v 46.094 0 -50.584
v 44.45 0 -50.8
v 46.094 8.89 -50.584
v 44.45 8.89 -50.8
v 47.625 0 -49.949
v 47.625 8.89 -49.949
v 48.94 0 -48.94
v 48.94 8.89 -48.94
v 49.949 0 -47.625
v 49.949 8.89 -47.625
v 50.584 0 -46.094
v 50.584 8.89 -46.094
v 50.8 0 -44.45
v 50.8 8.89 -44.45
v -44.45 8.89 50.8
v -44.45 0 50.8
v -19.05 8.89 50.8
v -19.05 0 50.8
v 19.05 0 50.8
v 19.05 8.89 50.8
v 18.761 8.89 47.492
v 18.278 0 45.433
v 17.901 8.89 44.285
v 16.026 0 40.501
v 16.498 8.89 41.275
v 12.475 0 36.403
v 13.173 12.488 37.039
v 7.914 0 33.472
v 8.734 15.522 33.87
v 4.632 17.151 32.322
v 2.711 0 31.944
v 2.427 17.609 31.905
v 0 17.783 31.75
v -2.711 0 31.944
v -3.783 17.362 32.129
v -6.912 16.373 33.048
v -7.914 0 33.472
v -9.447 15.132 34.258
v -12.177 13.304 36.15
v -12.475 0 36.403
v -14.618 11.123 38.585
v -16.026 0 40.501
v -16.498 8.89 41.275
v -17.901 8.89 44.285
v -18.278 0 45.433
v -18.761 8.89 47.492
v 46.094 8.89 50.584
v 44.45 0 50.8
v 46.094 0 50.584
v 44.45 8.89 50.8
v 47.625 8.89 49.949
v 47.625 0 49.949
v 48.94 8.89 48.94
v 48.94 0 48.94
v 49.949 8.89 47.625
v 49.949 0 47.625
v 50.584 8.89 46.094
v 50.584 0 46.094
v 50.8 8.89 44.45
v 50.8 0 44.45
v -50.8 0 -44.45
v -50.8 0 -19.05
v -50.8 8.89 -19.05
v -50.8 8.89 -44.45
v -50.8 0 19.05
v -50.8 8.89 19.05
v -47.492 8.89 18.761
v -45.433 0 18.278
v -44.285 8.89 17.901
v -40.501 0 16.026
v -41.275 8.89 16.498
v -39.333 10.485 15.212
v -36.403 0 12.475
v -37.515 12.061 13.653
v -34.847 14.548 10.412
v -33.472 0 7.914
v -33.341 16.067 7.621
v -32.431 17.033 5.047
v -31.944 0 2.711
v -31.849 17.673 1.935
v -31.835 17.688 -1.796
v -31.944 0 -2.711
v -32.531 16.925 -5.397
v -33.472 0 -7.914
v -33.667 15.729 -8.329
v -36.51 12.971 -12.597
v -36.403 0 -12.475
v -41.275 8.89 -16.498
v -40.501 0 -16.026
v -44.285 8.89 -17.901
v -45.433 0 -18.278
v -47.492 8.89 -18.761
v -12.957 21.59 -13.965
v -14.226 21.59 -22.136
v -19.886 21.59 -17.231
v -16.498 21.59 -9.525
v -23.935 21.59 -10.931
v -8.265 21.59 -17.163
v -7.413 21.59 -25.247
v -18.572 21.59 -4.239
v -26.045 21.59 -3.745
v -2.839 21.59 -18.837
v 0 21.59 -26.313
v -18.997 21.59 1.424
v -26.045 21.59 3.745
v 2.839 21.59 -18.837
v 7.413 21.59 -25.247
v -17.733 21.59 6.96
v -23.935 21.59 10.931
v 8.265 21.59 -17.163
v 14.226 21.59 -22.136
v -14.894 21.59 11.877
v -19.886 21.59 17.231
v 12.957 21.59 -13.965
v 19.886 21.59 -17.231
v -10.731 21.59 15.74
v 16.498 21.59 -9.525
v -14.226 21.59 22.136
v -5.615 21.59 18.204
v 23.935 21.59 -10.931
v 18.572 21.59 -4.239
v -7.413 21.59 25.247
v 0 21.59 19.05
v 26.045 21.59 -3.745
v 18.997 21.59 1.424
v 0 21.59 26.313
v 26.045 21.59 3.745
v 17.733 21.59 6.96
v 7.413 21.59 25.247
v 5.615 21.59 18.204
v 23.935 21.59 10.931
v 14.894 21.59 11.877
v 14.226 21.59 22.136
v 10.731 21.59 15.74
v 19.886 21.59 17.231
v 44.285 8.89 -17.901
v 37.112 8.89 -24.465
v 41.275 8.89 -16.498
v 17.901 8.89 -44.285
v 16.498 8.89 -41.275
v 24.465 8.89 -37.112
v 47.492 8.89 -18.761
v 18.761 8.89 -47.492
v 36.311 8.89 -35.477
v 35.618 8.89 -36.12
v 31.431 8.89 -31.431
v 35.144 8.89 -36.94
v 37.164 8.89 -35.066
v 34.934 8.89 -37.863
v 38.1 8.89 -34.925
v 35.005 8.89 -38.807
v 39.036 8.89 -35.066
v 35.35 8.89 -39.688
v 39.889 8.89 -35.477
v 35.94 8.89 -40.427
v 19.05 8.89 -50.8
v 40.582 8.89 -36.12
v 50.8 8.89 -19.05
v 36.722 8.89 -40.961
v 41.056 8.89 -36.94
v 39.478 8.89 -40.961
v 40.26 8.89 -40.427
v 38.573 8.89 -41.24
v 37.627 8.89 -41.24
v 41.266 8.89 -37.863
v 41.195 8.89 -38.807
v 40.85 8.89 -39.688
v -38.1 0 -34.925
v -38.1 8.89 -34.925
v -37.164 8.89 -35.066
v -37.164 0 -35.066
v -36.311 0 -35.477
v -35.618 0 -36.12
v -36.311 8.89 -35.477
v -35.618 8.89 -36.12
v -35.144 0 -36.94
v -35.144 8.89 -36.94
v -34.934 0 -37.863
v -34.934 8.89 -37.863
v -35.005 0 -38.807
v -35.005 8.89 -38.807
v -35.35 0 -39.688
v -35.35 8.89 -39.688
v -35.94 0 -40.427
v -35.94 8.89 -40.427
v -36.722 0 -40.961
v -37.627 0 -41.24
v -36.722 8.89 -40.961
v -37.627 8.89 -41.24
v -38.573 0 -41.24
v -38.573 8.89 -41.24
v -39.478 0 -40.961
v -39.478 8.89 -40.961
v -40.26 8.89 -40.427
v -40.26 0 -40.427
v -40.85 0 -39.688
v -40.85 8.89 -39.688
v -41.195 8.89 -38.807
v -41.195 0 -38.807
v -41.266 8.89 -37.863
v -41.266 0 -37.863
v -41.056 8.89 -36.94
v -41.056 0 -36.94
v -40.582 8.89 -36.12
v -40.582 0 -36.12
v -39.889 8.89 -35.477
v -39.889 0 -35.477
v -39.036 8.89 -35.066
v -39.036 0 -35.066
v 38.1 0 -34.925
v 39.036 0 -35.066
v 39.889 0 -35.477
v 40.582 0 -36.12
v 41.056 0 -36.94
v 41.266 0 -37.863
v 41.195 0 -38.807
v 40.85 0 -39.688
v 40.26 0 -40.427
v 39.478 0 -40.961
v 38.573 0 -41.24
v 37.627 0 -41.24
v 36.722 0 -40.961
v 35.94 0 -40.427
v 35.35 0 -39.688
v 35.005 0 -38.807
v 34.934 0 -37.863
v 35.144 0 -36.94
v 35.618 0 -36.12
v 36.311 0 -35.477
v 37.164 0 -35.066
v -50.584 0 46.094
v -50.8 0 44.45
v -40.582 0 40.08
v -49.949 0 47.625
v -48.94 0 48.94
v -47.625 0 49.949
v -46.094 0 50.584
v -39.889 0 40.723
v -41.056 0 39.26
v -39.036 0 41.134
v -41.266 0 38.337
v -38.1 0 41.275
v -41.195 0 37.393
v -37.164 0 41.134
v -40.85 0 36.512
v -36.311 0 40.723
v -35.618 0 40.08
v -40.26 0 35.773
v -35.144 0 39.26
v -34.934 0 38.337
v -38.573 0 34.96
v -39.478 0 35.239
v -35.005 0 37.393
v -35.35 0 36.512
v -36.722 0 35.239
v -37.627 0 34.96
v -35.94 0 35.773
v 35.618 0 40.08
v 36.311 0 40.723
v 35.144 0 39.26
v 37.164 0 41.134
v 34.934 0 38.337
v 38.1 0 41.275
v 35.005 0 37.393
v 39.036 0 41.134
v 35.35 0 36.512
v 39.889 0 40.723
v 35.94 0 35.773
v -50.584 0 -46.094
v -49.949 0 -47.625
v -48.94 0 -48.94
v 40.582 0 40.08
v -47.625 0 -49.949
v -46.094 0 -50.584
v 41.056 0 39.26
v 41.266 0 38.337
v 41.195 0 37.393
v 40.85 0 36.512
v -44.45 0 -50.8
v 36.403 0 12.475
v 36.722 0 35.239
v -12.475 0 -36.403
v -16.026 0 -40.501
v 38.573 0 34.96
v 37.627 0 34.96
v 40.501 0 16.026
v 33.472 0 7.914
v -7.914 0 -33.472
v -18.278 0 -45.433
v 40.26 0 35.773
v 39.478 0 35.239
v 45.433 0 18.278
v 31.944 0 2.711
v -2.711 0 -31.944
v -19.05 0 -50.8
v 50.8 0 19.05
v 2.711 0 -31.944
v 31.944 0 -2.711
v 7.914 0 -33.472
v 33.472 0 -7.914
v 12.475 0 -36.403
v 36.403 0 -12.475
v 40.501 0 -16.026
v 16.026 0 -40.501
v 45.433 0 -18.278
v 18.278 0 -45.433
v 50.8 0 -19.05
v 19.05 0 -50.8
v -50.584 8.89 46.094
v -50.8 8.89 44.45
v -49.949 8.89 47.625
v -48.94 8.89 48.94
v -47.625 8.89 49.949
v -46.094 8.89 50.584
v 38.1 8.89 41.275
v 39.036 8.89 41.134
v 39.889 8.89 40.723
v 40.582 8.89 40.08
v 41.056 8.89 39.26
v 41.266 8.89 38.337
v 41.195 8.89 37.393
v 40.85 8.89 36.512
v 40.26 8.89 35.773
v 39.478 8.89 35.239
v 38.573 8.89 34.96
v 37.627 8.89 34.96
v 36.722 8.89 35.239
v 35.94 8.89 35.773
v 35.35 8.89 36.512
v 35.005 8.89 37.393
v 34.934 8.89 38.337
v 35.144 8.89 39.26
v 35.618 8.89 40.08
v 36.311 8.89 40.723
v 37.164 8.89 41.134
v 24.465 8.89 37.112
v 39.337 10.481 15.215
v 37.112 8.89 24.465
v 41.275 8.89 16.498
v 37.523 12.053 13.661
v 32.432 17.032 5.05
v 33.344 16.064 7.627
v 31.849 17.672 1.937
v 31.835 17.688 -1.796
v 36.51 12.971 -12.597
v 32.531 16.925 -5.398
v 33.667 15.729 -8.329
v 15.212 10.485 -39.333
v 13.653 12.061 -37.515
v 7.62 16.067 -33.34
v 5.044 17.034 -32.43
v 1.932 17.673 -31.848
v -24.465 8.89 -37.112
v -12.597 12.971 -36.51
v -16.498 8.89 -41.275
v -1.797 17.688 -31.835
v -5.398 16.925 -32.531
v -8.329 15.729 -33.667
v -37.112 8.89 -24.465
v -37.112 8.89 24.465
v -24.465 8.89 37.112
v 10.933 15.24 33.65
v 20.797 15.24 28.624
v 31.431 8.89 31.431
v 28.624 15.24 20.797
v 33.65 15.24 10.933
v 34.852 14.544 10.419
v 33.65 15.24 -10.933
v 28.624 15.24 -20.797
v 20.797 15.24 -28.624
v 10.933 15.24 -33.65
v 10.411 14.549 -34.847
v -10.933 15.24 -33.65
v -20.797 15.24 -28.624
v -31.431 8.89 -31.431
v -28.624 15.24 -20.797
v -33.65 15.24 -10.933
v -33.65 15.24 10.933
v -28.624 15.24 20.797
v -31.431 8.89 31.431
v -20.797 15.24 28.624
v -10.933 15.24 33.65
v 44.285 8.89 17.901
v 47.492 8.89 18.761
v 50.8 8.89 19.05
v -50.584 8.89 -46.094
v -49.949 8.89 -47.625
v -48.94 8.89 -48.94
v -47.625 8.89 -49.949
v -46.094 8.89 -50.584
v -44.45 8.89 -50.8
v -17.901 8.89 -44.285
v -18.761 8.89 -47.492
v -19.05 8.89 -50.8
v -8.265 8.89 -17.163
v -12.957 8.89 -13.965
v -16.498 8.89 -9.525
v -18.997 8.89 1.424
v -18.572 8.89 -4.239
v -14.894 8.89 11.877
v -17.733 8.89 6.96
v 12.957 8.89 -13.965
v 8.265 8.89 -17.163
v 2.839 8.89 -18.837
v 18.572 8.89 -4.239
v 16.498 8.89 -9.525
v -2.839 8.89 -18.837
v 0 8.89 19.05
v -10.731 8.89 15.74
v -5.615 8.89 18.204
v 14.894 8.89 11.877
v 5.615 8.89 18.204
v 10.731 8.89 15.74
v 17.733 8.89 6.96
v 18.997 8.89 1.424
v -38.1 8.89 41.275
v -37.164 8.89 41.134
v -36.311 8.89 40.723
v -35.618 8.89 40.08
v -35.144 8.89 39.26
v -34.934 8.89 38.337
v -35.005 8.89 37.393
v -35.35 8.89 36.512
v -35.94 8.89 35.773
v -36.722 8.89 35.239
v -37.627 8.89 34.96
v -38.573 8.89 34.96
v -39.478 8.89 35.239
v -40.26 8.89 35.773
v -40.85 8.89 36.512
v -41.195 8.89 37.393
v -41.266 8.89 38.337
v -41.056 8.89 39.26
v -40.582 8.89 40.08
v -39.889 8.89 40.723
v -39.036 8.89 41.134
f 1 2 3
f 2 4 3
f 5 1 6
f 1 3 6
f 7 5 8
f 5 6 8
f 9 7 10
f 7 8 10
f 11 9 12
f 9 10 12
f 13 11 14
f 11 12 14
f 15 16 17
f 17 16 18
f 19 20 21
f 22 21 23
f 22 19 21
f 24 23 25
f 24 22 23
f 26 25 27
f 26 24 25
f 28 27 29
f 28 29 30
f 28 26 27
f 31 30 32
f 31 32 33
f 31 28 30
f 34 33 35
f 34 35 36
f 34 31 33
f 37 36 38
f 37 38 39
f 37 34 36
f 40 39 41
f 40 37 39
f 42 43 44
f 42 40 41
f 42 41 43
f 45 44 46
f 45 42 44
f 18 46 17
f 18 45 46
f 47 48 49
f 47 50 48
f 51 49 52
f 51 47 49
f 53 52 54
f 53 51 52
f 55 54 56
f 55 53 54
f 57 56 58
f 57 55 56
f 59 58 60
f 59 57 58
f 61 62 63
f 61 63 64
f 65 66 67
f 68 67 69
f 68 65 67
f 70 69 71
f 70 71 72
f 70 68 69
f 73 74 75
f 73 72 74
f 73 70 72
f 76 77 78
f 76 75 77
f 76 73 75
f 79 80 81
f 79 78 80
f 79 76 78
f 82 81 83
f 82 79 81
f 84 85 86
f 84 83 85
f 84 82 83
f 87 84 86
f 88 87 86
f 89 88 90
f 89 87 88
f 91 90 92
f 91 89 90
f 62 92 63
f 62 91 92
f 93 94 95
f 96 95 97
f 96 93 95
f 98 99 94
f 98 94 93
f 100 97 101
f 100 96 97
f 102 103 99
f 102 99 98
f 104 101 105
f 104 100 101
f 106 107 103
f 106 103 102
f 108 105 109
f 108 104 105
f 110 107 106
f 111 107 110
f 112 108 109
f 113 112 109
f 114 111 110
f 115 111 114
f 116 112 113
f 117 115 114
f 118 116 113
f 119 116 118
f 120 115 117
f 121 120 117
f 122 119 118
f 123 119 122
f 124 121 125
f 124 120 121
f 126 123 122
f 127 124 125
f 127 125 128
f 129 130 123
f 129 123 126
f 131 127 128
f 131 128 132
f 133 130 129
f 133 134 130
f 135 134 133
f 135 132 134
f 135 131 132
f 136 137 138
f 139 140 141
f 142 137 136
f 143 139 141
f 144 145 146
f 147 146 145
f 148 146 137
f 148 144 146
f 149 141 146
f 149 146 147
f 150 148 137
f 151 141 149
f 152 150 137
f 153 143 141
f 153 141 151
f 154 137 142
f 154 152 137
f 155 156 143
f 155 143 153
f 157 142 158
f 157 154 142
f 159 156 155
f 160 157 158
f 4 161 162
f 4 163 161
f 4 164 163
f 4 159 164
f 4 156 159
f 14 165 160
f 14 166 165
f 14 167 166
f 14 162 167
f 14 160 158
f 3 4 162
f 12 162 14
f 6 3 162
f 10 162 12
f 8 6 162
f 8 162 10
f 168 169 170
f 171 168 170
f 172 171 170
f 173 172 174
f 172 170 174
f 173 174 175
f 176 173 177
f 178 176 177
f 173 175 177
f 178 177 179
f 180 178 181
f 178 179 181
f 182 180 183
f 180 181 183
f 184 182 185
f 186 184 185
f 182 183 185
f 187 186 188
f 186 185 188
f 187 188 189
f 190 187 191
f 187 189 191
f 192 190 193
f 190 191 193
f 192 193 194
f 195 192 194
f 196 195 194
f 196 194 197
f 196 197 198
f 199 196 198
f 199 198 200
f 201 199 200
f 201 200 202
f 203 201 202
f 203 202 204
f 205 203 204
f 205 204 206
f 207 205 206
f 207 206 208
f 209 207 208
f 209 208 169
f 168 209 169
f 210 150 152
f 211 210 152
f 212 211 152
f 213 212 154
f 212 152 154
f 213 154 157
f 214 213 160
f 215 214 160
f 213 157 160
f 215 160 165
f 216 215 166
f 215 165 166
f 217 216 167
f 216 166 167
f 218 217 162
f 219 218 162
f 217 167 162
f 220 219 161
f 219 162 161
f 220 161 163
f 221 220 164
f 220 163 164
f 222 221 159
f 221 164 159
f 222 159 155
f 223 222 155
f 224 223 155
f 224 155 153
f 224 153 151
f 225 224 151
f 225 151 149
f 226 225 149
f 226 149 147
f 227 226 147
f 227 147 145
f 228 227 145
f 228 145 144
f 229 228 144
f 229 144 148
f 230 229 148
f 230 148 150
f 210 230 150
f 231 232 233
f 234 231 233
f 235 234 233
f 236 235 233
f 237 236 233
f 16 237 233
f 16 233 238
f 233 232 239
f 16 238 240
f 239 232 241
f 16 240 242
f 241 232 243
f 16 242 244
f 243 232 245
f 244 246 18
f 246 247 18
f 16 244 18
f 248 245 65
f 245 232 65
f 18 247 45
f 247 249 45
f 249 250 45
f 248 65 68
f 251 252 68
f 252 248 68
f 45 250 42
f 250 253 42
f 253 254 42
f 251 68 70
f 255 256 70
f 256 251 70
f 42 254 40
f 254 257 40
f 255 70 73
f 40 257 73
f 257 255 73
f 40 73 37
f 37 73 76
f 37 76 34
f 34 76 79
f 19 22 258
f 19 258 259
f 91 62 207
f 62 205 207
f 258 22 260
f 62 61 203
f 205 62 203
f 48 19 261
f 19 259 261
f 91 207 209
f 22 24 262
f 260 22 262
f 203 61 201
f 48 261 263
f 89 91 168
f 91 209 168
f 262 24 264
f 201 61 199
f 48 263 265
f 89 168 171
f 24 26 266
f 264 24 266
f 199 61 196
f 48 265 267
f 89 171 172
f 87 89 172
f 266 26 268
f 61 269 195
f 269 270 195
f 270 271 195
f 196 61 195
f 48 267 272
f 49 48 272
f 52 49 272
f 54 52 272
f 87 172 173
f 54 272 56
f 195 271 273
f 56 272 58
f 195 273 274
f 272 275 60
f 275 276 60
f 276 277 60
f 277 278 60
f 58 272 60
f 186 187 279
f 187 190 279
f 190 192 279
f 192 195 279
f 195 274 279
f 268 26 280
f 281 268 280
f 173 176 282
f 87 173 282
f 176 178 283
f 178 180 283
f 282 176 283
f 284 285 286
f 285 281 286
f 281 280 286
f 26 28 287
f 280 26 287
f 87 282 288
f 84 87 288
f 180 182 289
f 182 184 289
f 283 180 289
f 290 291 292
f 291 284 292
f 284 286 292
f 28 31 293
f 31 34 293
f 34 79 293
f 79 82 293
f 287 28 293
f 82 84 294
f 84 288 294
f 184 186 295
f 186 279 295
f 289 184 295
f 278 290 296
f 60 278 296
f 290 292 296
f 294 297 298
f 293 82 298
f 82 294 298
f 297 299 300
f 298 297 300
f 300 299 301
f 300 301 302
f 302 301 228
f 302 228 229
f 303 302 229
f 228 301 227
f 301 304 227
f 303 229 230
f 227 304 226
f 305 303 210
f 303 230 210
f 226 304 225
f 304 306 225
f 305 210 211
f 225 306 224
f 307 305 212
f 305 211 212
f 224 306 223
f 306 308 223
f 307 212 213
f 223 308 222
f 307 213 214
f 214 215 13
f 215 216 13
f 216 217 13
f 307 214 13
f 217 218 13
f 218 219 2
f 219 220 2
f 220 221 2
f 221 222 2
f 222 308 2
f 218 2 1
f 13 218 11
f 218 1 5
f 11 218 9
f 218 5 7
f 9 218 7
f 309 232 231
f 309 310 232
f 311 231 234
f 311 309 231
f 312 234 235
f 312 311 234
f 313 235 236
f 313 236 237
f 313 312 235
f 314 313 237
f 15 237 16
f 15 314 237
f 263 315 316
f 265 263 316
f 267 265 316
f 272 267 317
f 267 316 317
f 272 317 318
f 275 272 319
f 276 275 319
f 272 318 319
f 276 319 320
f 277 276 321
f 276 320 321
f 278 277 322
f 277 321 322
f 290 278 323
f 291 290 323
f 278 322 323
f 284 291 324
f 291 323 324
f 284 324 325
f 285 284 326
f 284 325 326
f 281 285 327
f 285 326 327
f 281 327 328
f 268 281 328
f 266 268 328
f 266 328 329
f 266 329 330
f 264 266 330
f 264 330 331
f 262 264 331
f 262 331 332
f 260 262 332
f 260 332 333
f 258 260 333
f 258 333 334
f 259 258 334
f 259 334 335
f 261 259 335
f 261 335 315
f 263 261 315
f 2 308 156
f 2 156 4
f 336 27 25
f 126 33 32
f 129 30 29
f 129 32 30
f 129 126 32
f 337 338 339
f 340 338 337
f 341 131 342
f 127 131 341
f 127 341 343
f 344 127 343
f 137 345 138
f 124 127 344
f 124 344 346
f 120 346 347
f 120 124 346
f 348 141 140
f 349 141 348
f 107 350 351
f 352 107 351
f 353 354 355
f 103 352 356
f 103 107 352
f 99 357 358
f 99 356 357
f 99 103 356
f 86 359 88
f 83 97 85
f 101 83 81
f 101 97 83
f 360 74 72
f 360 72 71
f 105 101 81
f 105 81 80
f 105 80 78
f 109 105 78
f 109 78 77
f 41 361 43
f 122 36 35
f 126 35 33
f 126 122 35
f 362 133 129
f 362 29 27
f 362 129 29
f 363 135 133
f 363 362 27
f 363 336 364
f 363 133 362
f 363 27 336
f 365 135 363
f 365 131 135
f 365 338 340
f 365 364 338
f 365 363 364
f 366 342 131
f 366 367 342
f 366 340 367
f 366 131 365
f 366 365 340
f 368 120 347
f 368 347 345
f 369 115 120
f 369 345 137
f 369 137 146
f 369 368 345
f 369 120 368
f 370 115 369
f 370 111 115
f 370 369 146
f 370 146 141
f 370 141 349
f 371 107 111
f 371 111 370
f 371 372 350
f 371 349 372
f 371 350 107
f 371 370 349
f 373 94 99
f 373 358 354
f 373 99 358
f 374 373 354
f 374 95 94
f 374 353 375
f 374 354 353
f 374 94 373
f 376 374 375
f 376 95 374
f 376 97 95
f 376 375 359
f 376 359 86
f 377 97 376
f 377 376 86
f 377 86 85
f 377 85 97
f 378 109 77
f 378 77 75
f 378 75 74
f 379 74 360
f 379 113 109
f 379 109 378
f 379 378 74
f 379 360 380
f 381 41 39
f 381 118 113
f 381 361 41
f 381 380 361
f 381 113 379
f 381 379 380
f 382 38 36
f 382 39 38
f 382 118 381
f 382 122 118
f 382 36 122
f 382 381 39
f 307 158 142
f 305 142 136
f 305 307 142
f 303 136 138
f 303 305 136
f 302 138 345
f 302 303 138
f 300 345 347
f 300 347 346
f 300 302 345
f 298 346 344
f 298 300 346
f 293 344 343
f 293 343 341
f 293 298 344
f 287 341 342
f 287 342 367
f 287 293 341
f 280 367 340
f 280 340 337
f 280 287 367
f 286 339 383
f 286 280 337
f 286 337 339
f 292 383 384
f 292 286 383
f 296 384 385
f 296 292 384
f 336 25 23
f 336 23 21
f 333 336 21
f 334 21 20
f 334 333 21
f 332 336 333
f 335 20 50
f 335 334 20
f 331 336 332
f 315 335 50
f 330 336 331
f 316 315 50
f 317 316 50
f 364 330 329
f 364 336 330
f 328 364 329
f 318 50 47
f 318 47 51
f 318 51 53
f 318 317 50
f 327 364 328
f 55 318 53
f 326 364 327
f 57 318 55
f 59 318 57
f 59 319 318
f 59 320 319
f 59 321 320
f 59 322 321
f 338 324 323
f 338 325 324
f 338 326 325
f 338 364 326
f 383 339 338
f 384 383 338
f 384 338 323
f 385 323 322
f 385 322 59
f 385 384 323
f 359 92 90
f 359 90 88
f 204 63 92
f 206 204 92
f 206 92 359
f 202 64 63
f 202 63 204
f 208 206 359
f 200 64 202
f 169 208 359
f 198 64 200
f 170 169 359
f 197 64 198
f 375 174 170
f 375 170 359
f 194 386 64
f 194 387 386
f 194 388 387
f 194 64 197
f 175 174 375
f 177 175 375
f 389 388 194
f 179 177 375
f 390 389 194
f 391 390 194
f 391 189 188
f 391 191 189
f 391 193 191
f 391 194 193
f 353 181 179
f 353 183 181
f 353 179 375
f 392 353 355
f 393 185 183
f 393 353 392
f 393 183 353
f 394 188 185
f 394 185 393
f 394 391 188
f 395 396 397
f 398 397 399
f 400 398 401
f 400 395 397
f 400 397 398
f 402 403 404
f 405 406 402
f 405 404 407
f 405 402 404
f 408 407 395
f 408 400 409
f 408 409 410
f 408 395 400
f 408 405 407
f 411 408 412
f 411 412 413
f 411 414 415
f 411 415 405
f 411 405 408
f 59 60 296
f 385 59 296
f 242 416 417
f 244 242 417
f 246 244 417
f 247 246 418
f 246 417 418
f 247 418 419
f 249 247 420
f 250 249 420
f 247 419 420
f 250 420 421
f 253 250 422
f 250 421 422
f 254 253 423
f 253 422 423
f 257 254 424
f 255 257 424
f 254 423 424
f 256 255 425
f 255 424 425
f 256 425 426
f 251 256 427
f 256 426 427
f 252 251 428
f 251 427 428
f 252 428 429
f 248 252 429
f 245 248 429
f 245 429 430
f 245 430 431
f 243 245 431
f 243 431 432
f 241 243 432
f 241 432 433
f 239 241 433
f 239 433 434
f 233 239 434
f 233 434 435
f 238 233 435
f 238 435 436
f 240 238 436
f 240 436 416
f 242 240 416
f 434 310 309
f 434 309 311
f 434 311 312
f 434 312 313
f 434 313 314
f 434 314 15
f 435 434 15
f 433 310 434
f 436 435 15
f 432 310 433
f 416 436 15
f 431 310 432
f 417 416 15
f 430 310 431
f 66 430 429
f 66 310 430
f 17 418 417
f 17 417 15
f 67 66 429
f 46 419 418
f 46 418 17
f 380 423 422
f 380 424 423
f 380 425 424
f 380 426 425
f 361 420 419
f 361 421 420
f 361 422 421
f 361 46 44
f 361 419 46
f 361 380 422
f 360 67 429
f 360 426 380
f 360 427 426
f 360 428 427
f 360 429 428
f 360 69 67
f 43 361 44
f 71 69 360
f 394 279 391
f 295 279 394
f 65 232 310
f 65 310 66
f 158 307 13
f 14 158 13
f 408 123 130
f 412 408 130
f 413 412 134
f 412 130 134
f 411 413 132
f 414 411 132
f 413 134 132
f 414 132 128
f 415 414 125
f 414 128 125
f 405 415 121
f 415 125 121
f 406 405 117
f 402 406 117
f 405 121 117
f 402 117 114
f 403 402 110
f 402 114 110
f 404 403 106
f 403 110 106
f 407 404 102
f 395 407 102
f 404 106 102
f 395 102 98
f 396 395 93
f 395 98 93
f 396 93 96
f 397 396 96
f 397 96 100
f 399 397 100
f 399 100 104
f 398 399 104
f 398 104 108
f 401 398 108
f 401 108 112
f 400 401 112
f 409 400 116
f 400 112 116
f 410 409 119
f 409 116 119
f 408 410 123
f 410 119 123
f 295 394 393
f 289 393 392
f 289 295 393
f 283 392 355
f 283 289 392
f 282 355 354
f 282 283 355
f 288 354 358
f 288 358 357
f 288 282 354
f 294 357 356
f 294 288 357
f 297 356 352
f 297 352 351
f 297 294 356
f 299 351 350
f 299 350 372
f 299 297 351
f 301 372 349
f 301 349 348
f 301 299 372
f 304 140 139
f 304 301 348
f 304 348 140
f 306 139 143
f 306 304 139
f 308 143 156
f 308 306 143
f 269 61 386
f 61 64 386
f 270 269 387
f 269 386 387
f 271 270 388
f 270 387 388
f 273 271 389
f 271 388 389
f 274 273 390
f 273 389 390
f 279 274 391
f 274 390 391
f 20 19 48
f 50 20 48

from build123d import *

# Parameters (mm, degrees)
SKETCH1_W           = 101.6
SKETCH1_H           = 101.6
BOSS_EXTRUDE1_DEPTH = 8.89
SKETCH2_R           = 44.45
BOSS_EXTRUDE2_DEPTH = 12.7
FILLET1_R           = 6.35
SKETCH5_R           = 3.175
CUT_EXTRUDE1_DEPTH  = 73.955945611
CHAMFER1_SIZE2      = 18.137479686
CHAMFER1_SIZE       = 12.7
SKETCH6_R           = 19.05
CUT_EXTRUDE2_DEPTH  = 12.7
SKETCH7_R           = 19.05
CUT_EXTRUDE3_DEPTH  = 76.016052282


with BuildPart() as part:
    # Sketch1 → Boss-Extrude1 (new body)
    with BuildSketch(Plane(origin=(0, 0, 0), x_dir=(1, 0, 0), z_dir=(0, 1, 0))):
        Rectangle(SKETCH1_W, SKETCH1_H)
    extrude(amount=BOSS_EXTRUDE1_DEPTH)

    # Sketch2 → Boss-Extrude2 (add)
    with BuildSketch(Plane(origin=(0, 8.89, 0), x_dir=(1, 0, 0), z_dir=(0, 1, 0))):
        with Locations(Location((0, 0, 0), (0, 0, 270))):
            Circle(SKETCH2_R)
    extrude(amount=BOSS_EXTRUDE2_DEPTH)

    # Fillet1
    fillet1_edges = [part.edges().sort_by_distance(p)[0] for p in [
        (-50.8, 4.445, -50.8),
        (50.8, 4.445, -50.8),
        (50.8, 4.445, 50.8),
        (-50.8, 4.445, 50.8),
    ]]
    fillet(fillet1_edges, radius=FILLET1_R)

    # Sketch5 → Cut-Extrude1 (cut, through all)
    with BuildSketch(Plane(origin=(0, 8.89, 0), x_dir=(1, 0, 0), z_dir=(0, 1, 0))):
        with Locations(Location((-38.1, 38.1, 0), (0, 0, 270))):
            Circle(SKETCH5_R)
        with Locations(Location((38.1, 38.1, 0), (0, 0, 270))):
            Circle(SKETCH5_R)
        with Locations(Location((-38.1, -38.1, 0), (0, 0, 270))):
            Circle(SKETCH5_R)
        with Locations(Location((38.1, -38.1, 0), (0, 0, 270))):
            Circle(SKETCH5_R)
    extrude(amount=-CUT_EXTRUDE1_DEPTH, mode=Mode.SUBTRACT)

    # Chamfer1
    chamfer1_edges = [part.edges().sort_by_distance(p)[0] for p in [
        (0, 21.59, -44.45),
    ]]
    chamfer1_side = [part.faces().sort_by_distance(p)[0] for p in [
        (0, 21.336, -44.45),
    ]]
    chamfer(chamfer1_edges, length=CHAMFER1_SIZE - 0.0001, length2=CHAMFER1_SIZE2 - 0.0001, reference=chamfer1_side[0])  # a hair under: the kernel refuses the full size

    # Sketch6 → Cut-Extrude2 (cut)
    with BuildSketch(Plane(origin=(0, 21.59, 0), x_dir=(1, 0, 0), z_dir=(0, 1, 0))):
        with Locations(Location((0, 0, 0), (0, 0, 270))):
            Circle(SKETCH6_R)
    extrude(amount=-CUT_EXTRUDE2_DEPTH, mode=Mode.SUBTRACT)

    # Sketch7 → Cut-Extrude3 (cut, through all)
    with BuildSketch(Plane(origin=(0, 0, 0), x_dir=(1, 0, 0), z_dir=(0, 1, 0))):
        with Locations((-50.8, 0)):
            Circle(SKETCH7_R)
        with Locations((0, 50.8)):
            Circle(SKETCH7_R)
        with Locations((50.8, 0)):
            Circle(SKETCH7_R)
        with Locations((0, -50.8)):
            Circle(SKETCH7_R)
    extrude(amount=CUT_EXTRUDE3_DEPTH, mode=Mode.SUBTRACT)


solid = part.part
